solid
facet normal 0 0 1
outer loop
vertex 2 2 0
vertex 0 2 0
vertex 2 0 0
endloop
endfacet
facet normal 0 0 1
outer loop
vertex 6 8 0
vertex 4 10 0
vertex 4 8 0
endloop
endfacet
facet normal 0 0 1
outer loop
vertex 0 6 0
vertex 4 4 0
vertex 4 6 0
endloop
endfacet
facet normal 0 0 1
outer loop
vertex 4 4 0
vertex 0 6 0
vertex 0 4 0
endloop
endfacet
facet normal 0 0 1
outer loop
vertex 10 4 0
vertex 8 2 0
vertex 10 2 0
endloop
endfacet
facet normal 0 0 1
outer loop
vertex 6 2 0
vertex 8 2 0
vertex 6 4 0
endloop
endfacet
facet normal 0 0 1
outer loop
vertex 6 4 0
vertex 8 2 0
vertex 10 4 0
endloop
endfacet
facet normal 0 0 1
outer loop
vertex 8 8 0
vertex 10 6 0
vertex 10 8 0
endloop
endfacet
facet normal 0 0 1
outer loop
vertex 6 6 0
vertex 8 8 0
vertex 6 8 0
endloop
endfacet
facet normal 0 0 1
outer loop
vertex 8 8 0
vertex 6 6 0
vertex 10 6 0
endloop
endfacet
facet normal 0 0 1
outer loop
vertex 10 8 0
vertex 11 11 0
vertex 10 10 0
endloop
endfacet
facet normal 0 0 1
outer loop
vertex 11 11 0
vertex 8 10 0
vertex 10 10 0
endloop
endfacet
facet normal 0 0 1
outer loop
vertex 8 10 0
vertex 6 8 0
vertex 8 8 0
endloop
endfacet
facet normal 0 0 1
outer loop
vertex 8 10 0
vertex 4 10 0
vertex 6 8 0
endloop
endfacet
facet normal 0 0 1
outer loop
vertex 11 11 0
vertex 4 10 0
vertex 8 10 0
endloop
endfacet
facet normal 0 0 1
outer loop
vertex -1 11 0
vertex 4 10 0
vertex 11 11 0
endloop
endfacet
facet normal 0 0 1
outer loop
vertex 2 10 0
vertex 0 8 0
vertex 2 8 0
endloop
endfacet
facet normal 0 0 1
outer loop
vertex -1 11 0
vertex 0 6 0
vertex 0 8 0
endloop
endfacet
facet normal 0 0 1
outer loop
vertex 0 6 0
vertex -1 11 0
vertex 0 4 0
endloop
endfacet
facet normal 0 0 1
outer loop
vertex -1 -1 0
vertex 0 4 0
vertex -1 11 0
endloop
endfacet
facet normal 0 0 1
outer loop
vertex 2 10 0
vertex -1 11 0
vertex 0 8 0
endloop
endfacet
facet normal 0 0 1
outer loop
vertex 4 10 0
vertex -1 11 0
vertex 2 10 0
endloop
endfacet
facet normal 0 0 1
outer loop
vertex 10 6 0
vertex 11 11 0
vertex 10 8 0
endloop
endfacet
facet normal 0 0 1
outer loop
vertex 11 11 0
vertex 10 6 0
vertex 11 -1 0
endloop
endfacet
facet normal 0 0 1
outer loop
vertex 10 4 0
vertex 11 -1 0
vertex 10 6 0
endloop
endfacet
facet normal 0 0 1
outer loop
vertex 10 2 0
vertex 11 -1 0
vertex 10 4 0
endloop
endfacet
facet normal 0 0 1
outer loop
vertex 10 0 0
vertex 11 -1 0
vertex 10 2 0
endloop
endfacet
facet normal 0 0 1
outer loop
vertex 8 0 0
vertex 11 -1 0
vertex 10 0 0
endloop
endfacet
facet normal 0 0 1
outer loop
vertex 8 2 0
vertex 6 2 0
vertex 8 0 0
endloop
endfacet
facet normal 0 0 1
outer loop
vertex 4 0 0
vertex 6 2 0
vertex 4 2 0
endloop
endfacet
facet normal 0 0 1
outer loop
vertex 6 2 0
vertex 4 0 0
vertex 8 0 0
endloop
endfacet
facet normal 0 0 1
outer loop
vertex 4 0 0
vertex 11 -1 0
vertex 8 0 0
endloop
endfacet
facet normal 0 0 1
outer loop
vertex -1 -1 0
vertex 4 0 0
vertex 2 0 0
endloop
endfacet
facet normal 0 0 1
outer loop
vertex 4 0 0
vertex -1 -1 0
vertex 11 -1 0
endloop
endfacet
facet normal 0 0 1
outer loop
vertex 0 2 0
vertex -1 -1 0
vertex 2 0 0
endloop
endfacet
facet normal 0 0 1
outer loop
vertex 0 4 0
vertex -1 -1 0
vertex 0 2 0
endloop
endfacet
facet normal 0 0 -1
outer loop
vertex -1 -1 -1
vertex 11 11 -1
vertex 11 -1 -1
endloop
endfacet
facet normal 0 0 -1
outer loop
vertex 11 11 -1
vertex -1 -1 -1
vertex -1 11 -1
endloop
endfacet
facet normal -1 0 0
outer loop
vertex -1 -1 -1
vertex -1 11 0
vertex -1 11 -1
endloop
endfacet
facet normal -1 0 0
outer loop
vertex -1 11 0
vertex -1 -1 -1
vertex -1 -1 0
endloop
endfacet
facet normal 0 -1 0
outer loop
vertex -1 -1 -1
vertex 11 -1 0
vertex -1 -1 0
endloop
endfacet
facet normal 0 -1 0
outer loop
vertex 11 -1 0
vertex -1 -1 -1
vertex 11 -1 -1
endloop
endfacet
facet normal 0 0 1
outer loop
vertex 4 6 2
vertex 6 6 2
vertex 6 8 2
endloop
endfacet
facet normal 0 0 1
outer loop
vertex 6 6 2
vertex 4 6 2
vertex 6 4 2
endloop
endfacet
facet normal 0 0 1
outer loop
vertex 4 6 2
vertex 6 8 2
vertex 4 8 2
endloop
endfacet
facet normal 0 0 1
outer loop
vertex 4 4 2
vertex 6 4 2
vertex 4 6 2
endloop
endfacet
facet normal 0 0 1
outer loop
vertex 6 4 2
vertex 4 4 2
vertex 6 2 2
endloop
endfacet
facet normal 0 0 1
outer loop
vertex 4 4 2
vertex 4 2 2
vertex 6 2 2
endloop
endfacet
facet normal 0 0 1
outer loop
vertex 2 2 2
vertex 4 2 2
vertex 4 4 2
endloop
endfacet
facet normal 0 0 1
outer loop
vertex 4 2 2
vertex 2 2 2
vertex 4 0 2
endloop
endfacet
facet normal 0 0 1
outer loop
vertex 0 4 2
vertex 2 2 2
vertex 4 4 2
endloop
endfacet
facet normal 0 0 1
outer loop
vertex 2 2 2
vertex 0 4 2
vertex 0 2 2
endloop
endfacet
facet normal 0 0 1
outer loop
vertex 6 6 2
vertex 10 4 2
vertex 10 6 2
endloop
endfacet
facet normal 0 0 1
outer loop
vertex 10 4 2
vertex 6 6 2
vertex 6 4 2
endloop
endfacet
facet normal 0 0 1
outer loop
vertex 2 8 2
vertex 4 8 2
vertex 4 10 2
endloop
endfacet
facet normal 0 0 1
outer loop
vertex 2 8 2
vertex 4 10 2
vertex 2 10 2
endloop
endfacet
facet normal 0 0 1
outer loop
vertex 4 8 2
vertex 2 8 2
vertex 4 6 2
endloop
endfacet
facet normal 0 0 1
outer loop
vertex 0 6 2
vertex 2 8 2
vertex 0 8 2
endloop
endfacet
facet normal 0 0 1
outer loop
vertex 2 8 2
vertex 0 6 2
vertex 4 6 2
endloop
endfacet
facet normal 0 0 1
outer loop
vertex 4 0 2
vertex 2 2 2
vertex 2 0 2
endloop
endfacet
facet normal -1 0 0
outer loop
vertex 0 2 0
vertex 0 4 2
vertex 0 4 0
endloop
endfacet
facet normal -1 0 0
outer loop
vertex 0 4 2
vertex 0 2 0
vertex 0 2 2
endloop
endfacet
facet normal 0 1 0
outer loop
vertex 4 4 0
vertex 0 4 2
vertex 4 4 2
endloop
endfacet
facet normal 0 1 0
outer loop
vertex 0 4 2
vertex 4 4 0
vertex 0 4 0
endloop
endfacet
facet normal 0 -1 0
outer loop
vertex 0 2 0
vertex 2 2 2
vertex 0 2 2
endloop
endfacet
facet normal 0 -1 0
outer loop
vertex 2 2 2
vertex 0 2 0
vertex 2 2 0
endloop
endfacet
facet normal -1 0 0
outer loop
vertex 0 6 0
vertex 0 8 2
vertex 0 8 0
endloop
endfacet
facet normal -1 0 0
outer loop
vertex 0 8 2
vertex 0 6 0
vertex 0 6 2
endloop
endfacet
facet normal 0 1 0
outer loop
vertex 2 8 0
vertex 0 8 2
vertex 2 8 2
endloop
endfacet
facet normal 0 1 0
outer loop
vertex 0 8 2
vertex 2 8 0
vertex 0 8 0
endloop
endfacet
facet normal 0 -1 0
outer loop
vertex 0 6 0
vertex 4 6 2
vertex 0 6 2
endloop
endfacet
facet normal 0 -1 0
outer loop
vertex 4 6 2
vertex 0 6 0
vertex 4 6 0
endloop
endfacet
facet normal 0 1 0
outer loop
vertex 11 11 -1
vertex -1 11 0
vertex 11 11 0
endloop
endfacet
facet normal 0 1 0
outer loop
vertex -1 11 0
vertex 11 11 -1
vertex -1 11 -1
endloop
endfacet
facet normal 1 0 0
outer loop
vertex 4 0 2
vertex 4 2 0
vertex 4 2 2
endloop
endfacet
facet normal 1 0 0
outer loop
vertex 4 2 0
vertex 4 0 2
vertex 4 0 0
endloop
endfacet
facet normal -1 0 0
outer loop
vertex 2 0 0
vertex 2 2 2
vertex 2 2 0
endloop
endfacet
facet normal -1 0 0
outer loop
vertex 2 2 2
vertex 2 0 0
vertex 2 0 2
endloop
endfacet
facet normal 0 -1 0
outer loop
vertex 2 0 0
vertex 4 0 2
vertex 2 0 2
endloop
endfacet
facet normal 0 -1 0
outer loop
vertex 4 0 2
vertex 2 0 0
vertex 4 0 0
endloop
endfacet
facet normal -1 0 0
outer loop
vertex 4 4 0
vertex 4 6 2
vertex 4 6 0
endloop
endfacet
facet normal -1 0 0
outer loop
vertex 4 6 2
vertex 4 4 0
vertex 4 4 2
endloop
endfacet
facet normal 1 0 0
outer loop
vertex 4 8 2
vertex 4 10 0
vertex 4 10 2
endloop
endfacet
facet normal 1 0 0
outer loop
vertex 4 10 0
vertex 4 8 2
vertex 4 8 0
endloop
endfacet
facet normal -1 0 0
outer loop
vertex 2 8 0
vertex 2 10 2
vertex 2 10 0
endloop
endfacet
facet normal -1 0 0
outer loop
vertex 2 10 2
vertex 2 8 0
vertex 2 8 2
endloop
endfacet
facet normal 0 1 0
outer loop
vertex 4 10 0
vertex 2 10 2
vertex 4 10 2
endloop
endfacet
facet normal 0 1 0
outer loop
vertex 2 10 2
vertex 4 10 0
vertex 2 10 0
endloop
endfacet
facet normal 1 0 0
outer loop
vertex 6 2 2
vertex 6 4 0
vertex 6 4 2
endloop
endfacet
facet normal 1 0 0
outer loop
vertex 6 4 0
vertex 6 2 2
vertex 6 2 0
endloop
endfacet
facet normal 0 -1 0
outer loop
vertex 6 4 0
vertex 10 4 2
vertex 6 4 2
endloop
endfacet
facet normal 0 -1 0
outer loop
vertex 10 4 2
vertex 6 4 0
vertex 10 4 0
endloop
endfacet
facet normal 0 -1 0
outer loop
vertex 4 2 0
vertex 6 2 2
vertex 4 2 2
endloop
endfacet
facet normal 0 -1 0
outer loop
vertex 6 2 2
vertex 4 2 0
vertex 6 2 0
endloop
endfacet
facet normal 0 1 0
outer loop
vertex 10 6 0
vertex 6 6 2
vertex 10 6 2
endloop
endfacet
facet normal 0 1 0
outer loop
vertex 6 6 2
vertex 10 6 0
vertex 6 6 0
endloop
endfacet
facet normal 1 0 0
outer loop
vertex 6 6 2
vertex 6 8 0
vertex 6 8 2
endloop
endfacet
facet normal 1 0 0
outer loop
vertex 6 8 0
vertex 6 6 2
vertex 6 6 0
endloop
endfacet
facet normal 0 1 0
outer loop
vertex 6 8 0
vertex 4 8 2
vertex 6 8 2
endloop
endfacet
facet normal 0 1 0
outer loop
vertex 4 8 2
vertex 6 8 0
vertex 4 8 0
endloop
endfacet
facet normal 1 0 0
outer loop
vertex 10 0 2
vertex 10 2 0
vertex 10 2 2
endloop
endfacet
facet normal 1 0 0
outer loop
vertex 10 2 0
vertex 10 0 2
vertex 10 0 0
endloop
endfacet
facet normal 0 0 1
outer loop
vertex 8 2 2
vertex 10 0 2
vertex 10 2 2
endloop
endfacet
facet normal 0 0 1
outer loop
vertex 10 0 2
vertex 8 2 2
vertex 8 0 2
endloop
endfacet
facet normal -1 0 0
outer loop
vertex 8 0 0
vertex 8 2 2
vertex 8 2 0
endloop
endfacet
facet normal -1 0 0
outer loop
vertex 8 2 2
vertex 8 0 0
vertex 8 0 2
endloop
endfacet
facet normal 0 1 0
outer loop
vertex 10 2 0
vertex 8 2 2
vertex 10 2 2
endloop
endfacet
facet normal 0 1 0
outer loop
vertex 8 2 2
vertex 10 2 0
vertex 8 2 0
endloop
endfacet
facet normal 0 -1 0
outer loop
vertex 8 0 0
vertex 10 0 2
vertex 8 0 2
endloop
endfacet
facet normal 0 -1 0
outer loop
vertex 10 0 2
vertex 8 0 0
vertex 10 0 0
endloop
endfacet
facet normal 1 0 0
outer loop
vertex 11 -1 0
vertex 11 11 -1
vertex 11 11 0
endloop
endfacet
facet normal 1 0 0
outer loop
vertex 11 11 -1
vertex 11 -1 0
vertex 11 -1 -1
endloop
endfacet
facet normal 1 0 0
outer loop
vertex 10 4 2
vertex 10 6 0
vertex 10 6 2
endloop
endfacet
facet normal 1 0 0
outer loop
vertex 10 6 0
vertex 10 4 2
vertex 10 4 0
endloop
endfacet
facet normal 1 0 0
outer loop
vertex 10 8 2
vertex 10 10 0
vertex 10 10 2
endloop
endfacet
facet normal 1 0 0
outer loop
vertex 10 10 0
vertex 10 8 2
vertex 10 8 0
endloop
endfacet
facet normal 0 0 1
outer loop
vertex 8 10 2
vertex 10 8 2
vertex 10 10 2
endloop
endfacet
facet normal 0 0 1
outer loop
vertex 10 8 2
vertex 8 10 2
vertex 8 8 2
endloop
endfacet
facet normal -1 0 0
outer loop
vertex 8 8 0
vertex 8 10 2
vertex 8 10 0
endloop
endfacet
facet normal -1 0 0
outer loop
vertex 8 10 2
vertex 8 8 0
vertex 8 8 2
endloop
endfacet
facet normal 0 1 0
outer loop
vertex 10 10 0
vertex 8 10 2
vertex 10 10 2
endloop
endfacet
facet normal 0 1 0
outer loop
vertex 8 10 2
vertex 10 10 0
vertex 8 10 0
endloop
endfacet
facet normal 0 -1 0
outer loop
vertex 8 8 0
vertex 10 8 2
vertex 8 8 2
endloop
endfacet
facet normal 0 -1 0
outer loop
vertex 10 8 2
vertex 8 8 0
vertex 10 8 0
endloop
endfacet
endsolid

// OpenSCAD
/*
Github_Avatar_Identicon_3D_Model_Generator.scad by MegaSaturnv
Generate identicons here: http://identicon.net/

To use the module "drawAvatar()" as part of your model, write:

use <Github_Avatar_Identicon_3D_Model_Generator.scad>

at the start of your code. Then drop this file the same directory as your model.
*/

//////////////////////////////////
// Customiser / Parametric code //
//////////////////////////////////

//list/array of strings. String is normally sent as list / array, but customiser requires it to be written like this:
LINE_1 = ".X.X.";
//list/array of strings. String is normally sent as list / array, but customiser requires it to be written like this:
LINE_2 = "XX.XX";
//list/array of strings. String is normally sent as list / array, but customiser requires it to be written like this:
LINE_3 = ".XXX.";
//list/array of strings. String is normally sent as list / array, but customiser requires it to be written like this:
LINE_4 = "..X..";
//list/array of strings. String is normally sent as list / array, but customiser requires it to be written like this:
LINE_5 = "X.X.X";

//Pixel size in mm
PIXEL_SIZE = 2;

//Pixel thickness in mm
PIXEL_THICKNESS = 2;

//Would you like to include a base? true / false
INCLUDE_BASE = true;

//Base thickness in mm
BASE_THICKNESS = 1;

//Base extra size, to create a 'lip' around the github avatar / pixel art
BASE_EXTRA_SIZE = 1;

module drawAvatar(identiconAvatar=" ", pixelSize=1, pixelThickness=1, includeBase=false, baseThickness=1, baseExtraSize=0) {
    for (i = [0 : len(identiconAvatar)-1], j = [0 : len(identiconAvatar[i])-1]) {
        if (!(identiconAvatar[i][j] == " " || identiconAvatar[i][j] == ".")) {
            translate([i*pixelSize, j*pixelSize, 0]) cube([pixelSize, pixelSize, pixelThickness]);
        }
		if (includeBase) {
			translate([i*pixelSize - baseExtraSize, j*pixelSize - baseExtraSize, -baseThickness]) cube([2*baseExtraSize + pixelSize, 2*baseExtraSize + pixelSize, baseThickness]);
		}
    }
}

PIXELS_STRING_LIST = [LINE_1, LINE_2, LINE_3, LINE_4, LINE_5];
drawAvatar(PIXELS_STRING_LIST, PIXEL_SIZE, PIXEL_THICKNESS, INCLUDE_BASE, BASE_THICKNESS, BASE_EXTRA_SIZE);

////////////////////
// Default values //
////////////////////
//drawAvatar(" ", 1, 1, false, 1, 0);

////////////////////
//    Examples    //
////////////////////
//list / array of strings. Any character which isn't a space or . is counted as a pixel
/*
avatar = [
    " X X ",
    "XX XX",
    " XXX ",
    "  X  ",
    "X X X"];
*/
//drawAvatar(avatar, 2, 2, true, 1, 1);
//drawAvatar(avatar, 2, 2, true, 2);
//drawAvatar(avatar, 4, 1);
//drawAvatar(avatar);
